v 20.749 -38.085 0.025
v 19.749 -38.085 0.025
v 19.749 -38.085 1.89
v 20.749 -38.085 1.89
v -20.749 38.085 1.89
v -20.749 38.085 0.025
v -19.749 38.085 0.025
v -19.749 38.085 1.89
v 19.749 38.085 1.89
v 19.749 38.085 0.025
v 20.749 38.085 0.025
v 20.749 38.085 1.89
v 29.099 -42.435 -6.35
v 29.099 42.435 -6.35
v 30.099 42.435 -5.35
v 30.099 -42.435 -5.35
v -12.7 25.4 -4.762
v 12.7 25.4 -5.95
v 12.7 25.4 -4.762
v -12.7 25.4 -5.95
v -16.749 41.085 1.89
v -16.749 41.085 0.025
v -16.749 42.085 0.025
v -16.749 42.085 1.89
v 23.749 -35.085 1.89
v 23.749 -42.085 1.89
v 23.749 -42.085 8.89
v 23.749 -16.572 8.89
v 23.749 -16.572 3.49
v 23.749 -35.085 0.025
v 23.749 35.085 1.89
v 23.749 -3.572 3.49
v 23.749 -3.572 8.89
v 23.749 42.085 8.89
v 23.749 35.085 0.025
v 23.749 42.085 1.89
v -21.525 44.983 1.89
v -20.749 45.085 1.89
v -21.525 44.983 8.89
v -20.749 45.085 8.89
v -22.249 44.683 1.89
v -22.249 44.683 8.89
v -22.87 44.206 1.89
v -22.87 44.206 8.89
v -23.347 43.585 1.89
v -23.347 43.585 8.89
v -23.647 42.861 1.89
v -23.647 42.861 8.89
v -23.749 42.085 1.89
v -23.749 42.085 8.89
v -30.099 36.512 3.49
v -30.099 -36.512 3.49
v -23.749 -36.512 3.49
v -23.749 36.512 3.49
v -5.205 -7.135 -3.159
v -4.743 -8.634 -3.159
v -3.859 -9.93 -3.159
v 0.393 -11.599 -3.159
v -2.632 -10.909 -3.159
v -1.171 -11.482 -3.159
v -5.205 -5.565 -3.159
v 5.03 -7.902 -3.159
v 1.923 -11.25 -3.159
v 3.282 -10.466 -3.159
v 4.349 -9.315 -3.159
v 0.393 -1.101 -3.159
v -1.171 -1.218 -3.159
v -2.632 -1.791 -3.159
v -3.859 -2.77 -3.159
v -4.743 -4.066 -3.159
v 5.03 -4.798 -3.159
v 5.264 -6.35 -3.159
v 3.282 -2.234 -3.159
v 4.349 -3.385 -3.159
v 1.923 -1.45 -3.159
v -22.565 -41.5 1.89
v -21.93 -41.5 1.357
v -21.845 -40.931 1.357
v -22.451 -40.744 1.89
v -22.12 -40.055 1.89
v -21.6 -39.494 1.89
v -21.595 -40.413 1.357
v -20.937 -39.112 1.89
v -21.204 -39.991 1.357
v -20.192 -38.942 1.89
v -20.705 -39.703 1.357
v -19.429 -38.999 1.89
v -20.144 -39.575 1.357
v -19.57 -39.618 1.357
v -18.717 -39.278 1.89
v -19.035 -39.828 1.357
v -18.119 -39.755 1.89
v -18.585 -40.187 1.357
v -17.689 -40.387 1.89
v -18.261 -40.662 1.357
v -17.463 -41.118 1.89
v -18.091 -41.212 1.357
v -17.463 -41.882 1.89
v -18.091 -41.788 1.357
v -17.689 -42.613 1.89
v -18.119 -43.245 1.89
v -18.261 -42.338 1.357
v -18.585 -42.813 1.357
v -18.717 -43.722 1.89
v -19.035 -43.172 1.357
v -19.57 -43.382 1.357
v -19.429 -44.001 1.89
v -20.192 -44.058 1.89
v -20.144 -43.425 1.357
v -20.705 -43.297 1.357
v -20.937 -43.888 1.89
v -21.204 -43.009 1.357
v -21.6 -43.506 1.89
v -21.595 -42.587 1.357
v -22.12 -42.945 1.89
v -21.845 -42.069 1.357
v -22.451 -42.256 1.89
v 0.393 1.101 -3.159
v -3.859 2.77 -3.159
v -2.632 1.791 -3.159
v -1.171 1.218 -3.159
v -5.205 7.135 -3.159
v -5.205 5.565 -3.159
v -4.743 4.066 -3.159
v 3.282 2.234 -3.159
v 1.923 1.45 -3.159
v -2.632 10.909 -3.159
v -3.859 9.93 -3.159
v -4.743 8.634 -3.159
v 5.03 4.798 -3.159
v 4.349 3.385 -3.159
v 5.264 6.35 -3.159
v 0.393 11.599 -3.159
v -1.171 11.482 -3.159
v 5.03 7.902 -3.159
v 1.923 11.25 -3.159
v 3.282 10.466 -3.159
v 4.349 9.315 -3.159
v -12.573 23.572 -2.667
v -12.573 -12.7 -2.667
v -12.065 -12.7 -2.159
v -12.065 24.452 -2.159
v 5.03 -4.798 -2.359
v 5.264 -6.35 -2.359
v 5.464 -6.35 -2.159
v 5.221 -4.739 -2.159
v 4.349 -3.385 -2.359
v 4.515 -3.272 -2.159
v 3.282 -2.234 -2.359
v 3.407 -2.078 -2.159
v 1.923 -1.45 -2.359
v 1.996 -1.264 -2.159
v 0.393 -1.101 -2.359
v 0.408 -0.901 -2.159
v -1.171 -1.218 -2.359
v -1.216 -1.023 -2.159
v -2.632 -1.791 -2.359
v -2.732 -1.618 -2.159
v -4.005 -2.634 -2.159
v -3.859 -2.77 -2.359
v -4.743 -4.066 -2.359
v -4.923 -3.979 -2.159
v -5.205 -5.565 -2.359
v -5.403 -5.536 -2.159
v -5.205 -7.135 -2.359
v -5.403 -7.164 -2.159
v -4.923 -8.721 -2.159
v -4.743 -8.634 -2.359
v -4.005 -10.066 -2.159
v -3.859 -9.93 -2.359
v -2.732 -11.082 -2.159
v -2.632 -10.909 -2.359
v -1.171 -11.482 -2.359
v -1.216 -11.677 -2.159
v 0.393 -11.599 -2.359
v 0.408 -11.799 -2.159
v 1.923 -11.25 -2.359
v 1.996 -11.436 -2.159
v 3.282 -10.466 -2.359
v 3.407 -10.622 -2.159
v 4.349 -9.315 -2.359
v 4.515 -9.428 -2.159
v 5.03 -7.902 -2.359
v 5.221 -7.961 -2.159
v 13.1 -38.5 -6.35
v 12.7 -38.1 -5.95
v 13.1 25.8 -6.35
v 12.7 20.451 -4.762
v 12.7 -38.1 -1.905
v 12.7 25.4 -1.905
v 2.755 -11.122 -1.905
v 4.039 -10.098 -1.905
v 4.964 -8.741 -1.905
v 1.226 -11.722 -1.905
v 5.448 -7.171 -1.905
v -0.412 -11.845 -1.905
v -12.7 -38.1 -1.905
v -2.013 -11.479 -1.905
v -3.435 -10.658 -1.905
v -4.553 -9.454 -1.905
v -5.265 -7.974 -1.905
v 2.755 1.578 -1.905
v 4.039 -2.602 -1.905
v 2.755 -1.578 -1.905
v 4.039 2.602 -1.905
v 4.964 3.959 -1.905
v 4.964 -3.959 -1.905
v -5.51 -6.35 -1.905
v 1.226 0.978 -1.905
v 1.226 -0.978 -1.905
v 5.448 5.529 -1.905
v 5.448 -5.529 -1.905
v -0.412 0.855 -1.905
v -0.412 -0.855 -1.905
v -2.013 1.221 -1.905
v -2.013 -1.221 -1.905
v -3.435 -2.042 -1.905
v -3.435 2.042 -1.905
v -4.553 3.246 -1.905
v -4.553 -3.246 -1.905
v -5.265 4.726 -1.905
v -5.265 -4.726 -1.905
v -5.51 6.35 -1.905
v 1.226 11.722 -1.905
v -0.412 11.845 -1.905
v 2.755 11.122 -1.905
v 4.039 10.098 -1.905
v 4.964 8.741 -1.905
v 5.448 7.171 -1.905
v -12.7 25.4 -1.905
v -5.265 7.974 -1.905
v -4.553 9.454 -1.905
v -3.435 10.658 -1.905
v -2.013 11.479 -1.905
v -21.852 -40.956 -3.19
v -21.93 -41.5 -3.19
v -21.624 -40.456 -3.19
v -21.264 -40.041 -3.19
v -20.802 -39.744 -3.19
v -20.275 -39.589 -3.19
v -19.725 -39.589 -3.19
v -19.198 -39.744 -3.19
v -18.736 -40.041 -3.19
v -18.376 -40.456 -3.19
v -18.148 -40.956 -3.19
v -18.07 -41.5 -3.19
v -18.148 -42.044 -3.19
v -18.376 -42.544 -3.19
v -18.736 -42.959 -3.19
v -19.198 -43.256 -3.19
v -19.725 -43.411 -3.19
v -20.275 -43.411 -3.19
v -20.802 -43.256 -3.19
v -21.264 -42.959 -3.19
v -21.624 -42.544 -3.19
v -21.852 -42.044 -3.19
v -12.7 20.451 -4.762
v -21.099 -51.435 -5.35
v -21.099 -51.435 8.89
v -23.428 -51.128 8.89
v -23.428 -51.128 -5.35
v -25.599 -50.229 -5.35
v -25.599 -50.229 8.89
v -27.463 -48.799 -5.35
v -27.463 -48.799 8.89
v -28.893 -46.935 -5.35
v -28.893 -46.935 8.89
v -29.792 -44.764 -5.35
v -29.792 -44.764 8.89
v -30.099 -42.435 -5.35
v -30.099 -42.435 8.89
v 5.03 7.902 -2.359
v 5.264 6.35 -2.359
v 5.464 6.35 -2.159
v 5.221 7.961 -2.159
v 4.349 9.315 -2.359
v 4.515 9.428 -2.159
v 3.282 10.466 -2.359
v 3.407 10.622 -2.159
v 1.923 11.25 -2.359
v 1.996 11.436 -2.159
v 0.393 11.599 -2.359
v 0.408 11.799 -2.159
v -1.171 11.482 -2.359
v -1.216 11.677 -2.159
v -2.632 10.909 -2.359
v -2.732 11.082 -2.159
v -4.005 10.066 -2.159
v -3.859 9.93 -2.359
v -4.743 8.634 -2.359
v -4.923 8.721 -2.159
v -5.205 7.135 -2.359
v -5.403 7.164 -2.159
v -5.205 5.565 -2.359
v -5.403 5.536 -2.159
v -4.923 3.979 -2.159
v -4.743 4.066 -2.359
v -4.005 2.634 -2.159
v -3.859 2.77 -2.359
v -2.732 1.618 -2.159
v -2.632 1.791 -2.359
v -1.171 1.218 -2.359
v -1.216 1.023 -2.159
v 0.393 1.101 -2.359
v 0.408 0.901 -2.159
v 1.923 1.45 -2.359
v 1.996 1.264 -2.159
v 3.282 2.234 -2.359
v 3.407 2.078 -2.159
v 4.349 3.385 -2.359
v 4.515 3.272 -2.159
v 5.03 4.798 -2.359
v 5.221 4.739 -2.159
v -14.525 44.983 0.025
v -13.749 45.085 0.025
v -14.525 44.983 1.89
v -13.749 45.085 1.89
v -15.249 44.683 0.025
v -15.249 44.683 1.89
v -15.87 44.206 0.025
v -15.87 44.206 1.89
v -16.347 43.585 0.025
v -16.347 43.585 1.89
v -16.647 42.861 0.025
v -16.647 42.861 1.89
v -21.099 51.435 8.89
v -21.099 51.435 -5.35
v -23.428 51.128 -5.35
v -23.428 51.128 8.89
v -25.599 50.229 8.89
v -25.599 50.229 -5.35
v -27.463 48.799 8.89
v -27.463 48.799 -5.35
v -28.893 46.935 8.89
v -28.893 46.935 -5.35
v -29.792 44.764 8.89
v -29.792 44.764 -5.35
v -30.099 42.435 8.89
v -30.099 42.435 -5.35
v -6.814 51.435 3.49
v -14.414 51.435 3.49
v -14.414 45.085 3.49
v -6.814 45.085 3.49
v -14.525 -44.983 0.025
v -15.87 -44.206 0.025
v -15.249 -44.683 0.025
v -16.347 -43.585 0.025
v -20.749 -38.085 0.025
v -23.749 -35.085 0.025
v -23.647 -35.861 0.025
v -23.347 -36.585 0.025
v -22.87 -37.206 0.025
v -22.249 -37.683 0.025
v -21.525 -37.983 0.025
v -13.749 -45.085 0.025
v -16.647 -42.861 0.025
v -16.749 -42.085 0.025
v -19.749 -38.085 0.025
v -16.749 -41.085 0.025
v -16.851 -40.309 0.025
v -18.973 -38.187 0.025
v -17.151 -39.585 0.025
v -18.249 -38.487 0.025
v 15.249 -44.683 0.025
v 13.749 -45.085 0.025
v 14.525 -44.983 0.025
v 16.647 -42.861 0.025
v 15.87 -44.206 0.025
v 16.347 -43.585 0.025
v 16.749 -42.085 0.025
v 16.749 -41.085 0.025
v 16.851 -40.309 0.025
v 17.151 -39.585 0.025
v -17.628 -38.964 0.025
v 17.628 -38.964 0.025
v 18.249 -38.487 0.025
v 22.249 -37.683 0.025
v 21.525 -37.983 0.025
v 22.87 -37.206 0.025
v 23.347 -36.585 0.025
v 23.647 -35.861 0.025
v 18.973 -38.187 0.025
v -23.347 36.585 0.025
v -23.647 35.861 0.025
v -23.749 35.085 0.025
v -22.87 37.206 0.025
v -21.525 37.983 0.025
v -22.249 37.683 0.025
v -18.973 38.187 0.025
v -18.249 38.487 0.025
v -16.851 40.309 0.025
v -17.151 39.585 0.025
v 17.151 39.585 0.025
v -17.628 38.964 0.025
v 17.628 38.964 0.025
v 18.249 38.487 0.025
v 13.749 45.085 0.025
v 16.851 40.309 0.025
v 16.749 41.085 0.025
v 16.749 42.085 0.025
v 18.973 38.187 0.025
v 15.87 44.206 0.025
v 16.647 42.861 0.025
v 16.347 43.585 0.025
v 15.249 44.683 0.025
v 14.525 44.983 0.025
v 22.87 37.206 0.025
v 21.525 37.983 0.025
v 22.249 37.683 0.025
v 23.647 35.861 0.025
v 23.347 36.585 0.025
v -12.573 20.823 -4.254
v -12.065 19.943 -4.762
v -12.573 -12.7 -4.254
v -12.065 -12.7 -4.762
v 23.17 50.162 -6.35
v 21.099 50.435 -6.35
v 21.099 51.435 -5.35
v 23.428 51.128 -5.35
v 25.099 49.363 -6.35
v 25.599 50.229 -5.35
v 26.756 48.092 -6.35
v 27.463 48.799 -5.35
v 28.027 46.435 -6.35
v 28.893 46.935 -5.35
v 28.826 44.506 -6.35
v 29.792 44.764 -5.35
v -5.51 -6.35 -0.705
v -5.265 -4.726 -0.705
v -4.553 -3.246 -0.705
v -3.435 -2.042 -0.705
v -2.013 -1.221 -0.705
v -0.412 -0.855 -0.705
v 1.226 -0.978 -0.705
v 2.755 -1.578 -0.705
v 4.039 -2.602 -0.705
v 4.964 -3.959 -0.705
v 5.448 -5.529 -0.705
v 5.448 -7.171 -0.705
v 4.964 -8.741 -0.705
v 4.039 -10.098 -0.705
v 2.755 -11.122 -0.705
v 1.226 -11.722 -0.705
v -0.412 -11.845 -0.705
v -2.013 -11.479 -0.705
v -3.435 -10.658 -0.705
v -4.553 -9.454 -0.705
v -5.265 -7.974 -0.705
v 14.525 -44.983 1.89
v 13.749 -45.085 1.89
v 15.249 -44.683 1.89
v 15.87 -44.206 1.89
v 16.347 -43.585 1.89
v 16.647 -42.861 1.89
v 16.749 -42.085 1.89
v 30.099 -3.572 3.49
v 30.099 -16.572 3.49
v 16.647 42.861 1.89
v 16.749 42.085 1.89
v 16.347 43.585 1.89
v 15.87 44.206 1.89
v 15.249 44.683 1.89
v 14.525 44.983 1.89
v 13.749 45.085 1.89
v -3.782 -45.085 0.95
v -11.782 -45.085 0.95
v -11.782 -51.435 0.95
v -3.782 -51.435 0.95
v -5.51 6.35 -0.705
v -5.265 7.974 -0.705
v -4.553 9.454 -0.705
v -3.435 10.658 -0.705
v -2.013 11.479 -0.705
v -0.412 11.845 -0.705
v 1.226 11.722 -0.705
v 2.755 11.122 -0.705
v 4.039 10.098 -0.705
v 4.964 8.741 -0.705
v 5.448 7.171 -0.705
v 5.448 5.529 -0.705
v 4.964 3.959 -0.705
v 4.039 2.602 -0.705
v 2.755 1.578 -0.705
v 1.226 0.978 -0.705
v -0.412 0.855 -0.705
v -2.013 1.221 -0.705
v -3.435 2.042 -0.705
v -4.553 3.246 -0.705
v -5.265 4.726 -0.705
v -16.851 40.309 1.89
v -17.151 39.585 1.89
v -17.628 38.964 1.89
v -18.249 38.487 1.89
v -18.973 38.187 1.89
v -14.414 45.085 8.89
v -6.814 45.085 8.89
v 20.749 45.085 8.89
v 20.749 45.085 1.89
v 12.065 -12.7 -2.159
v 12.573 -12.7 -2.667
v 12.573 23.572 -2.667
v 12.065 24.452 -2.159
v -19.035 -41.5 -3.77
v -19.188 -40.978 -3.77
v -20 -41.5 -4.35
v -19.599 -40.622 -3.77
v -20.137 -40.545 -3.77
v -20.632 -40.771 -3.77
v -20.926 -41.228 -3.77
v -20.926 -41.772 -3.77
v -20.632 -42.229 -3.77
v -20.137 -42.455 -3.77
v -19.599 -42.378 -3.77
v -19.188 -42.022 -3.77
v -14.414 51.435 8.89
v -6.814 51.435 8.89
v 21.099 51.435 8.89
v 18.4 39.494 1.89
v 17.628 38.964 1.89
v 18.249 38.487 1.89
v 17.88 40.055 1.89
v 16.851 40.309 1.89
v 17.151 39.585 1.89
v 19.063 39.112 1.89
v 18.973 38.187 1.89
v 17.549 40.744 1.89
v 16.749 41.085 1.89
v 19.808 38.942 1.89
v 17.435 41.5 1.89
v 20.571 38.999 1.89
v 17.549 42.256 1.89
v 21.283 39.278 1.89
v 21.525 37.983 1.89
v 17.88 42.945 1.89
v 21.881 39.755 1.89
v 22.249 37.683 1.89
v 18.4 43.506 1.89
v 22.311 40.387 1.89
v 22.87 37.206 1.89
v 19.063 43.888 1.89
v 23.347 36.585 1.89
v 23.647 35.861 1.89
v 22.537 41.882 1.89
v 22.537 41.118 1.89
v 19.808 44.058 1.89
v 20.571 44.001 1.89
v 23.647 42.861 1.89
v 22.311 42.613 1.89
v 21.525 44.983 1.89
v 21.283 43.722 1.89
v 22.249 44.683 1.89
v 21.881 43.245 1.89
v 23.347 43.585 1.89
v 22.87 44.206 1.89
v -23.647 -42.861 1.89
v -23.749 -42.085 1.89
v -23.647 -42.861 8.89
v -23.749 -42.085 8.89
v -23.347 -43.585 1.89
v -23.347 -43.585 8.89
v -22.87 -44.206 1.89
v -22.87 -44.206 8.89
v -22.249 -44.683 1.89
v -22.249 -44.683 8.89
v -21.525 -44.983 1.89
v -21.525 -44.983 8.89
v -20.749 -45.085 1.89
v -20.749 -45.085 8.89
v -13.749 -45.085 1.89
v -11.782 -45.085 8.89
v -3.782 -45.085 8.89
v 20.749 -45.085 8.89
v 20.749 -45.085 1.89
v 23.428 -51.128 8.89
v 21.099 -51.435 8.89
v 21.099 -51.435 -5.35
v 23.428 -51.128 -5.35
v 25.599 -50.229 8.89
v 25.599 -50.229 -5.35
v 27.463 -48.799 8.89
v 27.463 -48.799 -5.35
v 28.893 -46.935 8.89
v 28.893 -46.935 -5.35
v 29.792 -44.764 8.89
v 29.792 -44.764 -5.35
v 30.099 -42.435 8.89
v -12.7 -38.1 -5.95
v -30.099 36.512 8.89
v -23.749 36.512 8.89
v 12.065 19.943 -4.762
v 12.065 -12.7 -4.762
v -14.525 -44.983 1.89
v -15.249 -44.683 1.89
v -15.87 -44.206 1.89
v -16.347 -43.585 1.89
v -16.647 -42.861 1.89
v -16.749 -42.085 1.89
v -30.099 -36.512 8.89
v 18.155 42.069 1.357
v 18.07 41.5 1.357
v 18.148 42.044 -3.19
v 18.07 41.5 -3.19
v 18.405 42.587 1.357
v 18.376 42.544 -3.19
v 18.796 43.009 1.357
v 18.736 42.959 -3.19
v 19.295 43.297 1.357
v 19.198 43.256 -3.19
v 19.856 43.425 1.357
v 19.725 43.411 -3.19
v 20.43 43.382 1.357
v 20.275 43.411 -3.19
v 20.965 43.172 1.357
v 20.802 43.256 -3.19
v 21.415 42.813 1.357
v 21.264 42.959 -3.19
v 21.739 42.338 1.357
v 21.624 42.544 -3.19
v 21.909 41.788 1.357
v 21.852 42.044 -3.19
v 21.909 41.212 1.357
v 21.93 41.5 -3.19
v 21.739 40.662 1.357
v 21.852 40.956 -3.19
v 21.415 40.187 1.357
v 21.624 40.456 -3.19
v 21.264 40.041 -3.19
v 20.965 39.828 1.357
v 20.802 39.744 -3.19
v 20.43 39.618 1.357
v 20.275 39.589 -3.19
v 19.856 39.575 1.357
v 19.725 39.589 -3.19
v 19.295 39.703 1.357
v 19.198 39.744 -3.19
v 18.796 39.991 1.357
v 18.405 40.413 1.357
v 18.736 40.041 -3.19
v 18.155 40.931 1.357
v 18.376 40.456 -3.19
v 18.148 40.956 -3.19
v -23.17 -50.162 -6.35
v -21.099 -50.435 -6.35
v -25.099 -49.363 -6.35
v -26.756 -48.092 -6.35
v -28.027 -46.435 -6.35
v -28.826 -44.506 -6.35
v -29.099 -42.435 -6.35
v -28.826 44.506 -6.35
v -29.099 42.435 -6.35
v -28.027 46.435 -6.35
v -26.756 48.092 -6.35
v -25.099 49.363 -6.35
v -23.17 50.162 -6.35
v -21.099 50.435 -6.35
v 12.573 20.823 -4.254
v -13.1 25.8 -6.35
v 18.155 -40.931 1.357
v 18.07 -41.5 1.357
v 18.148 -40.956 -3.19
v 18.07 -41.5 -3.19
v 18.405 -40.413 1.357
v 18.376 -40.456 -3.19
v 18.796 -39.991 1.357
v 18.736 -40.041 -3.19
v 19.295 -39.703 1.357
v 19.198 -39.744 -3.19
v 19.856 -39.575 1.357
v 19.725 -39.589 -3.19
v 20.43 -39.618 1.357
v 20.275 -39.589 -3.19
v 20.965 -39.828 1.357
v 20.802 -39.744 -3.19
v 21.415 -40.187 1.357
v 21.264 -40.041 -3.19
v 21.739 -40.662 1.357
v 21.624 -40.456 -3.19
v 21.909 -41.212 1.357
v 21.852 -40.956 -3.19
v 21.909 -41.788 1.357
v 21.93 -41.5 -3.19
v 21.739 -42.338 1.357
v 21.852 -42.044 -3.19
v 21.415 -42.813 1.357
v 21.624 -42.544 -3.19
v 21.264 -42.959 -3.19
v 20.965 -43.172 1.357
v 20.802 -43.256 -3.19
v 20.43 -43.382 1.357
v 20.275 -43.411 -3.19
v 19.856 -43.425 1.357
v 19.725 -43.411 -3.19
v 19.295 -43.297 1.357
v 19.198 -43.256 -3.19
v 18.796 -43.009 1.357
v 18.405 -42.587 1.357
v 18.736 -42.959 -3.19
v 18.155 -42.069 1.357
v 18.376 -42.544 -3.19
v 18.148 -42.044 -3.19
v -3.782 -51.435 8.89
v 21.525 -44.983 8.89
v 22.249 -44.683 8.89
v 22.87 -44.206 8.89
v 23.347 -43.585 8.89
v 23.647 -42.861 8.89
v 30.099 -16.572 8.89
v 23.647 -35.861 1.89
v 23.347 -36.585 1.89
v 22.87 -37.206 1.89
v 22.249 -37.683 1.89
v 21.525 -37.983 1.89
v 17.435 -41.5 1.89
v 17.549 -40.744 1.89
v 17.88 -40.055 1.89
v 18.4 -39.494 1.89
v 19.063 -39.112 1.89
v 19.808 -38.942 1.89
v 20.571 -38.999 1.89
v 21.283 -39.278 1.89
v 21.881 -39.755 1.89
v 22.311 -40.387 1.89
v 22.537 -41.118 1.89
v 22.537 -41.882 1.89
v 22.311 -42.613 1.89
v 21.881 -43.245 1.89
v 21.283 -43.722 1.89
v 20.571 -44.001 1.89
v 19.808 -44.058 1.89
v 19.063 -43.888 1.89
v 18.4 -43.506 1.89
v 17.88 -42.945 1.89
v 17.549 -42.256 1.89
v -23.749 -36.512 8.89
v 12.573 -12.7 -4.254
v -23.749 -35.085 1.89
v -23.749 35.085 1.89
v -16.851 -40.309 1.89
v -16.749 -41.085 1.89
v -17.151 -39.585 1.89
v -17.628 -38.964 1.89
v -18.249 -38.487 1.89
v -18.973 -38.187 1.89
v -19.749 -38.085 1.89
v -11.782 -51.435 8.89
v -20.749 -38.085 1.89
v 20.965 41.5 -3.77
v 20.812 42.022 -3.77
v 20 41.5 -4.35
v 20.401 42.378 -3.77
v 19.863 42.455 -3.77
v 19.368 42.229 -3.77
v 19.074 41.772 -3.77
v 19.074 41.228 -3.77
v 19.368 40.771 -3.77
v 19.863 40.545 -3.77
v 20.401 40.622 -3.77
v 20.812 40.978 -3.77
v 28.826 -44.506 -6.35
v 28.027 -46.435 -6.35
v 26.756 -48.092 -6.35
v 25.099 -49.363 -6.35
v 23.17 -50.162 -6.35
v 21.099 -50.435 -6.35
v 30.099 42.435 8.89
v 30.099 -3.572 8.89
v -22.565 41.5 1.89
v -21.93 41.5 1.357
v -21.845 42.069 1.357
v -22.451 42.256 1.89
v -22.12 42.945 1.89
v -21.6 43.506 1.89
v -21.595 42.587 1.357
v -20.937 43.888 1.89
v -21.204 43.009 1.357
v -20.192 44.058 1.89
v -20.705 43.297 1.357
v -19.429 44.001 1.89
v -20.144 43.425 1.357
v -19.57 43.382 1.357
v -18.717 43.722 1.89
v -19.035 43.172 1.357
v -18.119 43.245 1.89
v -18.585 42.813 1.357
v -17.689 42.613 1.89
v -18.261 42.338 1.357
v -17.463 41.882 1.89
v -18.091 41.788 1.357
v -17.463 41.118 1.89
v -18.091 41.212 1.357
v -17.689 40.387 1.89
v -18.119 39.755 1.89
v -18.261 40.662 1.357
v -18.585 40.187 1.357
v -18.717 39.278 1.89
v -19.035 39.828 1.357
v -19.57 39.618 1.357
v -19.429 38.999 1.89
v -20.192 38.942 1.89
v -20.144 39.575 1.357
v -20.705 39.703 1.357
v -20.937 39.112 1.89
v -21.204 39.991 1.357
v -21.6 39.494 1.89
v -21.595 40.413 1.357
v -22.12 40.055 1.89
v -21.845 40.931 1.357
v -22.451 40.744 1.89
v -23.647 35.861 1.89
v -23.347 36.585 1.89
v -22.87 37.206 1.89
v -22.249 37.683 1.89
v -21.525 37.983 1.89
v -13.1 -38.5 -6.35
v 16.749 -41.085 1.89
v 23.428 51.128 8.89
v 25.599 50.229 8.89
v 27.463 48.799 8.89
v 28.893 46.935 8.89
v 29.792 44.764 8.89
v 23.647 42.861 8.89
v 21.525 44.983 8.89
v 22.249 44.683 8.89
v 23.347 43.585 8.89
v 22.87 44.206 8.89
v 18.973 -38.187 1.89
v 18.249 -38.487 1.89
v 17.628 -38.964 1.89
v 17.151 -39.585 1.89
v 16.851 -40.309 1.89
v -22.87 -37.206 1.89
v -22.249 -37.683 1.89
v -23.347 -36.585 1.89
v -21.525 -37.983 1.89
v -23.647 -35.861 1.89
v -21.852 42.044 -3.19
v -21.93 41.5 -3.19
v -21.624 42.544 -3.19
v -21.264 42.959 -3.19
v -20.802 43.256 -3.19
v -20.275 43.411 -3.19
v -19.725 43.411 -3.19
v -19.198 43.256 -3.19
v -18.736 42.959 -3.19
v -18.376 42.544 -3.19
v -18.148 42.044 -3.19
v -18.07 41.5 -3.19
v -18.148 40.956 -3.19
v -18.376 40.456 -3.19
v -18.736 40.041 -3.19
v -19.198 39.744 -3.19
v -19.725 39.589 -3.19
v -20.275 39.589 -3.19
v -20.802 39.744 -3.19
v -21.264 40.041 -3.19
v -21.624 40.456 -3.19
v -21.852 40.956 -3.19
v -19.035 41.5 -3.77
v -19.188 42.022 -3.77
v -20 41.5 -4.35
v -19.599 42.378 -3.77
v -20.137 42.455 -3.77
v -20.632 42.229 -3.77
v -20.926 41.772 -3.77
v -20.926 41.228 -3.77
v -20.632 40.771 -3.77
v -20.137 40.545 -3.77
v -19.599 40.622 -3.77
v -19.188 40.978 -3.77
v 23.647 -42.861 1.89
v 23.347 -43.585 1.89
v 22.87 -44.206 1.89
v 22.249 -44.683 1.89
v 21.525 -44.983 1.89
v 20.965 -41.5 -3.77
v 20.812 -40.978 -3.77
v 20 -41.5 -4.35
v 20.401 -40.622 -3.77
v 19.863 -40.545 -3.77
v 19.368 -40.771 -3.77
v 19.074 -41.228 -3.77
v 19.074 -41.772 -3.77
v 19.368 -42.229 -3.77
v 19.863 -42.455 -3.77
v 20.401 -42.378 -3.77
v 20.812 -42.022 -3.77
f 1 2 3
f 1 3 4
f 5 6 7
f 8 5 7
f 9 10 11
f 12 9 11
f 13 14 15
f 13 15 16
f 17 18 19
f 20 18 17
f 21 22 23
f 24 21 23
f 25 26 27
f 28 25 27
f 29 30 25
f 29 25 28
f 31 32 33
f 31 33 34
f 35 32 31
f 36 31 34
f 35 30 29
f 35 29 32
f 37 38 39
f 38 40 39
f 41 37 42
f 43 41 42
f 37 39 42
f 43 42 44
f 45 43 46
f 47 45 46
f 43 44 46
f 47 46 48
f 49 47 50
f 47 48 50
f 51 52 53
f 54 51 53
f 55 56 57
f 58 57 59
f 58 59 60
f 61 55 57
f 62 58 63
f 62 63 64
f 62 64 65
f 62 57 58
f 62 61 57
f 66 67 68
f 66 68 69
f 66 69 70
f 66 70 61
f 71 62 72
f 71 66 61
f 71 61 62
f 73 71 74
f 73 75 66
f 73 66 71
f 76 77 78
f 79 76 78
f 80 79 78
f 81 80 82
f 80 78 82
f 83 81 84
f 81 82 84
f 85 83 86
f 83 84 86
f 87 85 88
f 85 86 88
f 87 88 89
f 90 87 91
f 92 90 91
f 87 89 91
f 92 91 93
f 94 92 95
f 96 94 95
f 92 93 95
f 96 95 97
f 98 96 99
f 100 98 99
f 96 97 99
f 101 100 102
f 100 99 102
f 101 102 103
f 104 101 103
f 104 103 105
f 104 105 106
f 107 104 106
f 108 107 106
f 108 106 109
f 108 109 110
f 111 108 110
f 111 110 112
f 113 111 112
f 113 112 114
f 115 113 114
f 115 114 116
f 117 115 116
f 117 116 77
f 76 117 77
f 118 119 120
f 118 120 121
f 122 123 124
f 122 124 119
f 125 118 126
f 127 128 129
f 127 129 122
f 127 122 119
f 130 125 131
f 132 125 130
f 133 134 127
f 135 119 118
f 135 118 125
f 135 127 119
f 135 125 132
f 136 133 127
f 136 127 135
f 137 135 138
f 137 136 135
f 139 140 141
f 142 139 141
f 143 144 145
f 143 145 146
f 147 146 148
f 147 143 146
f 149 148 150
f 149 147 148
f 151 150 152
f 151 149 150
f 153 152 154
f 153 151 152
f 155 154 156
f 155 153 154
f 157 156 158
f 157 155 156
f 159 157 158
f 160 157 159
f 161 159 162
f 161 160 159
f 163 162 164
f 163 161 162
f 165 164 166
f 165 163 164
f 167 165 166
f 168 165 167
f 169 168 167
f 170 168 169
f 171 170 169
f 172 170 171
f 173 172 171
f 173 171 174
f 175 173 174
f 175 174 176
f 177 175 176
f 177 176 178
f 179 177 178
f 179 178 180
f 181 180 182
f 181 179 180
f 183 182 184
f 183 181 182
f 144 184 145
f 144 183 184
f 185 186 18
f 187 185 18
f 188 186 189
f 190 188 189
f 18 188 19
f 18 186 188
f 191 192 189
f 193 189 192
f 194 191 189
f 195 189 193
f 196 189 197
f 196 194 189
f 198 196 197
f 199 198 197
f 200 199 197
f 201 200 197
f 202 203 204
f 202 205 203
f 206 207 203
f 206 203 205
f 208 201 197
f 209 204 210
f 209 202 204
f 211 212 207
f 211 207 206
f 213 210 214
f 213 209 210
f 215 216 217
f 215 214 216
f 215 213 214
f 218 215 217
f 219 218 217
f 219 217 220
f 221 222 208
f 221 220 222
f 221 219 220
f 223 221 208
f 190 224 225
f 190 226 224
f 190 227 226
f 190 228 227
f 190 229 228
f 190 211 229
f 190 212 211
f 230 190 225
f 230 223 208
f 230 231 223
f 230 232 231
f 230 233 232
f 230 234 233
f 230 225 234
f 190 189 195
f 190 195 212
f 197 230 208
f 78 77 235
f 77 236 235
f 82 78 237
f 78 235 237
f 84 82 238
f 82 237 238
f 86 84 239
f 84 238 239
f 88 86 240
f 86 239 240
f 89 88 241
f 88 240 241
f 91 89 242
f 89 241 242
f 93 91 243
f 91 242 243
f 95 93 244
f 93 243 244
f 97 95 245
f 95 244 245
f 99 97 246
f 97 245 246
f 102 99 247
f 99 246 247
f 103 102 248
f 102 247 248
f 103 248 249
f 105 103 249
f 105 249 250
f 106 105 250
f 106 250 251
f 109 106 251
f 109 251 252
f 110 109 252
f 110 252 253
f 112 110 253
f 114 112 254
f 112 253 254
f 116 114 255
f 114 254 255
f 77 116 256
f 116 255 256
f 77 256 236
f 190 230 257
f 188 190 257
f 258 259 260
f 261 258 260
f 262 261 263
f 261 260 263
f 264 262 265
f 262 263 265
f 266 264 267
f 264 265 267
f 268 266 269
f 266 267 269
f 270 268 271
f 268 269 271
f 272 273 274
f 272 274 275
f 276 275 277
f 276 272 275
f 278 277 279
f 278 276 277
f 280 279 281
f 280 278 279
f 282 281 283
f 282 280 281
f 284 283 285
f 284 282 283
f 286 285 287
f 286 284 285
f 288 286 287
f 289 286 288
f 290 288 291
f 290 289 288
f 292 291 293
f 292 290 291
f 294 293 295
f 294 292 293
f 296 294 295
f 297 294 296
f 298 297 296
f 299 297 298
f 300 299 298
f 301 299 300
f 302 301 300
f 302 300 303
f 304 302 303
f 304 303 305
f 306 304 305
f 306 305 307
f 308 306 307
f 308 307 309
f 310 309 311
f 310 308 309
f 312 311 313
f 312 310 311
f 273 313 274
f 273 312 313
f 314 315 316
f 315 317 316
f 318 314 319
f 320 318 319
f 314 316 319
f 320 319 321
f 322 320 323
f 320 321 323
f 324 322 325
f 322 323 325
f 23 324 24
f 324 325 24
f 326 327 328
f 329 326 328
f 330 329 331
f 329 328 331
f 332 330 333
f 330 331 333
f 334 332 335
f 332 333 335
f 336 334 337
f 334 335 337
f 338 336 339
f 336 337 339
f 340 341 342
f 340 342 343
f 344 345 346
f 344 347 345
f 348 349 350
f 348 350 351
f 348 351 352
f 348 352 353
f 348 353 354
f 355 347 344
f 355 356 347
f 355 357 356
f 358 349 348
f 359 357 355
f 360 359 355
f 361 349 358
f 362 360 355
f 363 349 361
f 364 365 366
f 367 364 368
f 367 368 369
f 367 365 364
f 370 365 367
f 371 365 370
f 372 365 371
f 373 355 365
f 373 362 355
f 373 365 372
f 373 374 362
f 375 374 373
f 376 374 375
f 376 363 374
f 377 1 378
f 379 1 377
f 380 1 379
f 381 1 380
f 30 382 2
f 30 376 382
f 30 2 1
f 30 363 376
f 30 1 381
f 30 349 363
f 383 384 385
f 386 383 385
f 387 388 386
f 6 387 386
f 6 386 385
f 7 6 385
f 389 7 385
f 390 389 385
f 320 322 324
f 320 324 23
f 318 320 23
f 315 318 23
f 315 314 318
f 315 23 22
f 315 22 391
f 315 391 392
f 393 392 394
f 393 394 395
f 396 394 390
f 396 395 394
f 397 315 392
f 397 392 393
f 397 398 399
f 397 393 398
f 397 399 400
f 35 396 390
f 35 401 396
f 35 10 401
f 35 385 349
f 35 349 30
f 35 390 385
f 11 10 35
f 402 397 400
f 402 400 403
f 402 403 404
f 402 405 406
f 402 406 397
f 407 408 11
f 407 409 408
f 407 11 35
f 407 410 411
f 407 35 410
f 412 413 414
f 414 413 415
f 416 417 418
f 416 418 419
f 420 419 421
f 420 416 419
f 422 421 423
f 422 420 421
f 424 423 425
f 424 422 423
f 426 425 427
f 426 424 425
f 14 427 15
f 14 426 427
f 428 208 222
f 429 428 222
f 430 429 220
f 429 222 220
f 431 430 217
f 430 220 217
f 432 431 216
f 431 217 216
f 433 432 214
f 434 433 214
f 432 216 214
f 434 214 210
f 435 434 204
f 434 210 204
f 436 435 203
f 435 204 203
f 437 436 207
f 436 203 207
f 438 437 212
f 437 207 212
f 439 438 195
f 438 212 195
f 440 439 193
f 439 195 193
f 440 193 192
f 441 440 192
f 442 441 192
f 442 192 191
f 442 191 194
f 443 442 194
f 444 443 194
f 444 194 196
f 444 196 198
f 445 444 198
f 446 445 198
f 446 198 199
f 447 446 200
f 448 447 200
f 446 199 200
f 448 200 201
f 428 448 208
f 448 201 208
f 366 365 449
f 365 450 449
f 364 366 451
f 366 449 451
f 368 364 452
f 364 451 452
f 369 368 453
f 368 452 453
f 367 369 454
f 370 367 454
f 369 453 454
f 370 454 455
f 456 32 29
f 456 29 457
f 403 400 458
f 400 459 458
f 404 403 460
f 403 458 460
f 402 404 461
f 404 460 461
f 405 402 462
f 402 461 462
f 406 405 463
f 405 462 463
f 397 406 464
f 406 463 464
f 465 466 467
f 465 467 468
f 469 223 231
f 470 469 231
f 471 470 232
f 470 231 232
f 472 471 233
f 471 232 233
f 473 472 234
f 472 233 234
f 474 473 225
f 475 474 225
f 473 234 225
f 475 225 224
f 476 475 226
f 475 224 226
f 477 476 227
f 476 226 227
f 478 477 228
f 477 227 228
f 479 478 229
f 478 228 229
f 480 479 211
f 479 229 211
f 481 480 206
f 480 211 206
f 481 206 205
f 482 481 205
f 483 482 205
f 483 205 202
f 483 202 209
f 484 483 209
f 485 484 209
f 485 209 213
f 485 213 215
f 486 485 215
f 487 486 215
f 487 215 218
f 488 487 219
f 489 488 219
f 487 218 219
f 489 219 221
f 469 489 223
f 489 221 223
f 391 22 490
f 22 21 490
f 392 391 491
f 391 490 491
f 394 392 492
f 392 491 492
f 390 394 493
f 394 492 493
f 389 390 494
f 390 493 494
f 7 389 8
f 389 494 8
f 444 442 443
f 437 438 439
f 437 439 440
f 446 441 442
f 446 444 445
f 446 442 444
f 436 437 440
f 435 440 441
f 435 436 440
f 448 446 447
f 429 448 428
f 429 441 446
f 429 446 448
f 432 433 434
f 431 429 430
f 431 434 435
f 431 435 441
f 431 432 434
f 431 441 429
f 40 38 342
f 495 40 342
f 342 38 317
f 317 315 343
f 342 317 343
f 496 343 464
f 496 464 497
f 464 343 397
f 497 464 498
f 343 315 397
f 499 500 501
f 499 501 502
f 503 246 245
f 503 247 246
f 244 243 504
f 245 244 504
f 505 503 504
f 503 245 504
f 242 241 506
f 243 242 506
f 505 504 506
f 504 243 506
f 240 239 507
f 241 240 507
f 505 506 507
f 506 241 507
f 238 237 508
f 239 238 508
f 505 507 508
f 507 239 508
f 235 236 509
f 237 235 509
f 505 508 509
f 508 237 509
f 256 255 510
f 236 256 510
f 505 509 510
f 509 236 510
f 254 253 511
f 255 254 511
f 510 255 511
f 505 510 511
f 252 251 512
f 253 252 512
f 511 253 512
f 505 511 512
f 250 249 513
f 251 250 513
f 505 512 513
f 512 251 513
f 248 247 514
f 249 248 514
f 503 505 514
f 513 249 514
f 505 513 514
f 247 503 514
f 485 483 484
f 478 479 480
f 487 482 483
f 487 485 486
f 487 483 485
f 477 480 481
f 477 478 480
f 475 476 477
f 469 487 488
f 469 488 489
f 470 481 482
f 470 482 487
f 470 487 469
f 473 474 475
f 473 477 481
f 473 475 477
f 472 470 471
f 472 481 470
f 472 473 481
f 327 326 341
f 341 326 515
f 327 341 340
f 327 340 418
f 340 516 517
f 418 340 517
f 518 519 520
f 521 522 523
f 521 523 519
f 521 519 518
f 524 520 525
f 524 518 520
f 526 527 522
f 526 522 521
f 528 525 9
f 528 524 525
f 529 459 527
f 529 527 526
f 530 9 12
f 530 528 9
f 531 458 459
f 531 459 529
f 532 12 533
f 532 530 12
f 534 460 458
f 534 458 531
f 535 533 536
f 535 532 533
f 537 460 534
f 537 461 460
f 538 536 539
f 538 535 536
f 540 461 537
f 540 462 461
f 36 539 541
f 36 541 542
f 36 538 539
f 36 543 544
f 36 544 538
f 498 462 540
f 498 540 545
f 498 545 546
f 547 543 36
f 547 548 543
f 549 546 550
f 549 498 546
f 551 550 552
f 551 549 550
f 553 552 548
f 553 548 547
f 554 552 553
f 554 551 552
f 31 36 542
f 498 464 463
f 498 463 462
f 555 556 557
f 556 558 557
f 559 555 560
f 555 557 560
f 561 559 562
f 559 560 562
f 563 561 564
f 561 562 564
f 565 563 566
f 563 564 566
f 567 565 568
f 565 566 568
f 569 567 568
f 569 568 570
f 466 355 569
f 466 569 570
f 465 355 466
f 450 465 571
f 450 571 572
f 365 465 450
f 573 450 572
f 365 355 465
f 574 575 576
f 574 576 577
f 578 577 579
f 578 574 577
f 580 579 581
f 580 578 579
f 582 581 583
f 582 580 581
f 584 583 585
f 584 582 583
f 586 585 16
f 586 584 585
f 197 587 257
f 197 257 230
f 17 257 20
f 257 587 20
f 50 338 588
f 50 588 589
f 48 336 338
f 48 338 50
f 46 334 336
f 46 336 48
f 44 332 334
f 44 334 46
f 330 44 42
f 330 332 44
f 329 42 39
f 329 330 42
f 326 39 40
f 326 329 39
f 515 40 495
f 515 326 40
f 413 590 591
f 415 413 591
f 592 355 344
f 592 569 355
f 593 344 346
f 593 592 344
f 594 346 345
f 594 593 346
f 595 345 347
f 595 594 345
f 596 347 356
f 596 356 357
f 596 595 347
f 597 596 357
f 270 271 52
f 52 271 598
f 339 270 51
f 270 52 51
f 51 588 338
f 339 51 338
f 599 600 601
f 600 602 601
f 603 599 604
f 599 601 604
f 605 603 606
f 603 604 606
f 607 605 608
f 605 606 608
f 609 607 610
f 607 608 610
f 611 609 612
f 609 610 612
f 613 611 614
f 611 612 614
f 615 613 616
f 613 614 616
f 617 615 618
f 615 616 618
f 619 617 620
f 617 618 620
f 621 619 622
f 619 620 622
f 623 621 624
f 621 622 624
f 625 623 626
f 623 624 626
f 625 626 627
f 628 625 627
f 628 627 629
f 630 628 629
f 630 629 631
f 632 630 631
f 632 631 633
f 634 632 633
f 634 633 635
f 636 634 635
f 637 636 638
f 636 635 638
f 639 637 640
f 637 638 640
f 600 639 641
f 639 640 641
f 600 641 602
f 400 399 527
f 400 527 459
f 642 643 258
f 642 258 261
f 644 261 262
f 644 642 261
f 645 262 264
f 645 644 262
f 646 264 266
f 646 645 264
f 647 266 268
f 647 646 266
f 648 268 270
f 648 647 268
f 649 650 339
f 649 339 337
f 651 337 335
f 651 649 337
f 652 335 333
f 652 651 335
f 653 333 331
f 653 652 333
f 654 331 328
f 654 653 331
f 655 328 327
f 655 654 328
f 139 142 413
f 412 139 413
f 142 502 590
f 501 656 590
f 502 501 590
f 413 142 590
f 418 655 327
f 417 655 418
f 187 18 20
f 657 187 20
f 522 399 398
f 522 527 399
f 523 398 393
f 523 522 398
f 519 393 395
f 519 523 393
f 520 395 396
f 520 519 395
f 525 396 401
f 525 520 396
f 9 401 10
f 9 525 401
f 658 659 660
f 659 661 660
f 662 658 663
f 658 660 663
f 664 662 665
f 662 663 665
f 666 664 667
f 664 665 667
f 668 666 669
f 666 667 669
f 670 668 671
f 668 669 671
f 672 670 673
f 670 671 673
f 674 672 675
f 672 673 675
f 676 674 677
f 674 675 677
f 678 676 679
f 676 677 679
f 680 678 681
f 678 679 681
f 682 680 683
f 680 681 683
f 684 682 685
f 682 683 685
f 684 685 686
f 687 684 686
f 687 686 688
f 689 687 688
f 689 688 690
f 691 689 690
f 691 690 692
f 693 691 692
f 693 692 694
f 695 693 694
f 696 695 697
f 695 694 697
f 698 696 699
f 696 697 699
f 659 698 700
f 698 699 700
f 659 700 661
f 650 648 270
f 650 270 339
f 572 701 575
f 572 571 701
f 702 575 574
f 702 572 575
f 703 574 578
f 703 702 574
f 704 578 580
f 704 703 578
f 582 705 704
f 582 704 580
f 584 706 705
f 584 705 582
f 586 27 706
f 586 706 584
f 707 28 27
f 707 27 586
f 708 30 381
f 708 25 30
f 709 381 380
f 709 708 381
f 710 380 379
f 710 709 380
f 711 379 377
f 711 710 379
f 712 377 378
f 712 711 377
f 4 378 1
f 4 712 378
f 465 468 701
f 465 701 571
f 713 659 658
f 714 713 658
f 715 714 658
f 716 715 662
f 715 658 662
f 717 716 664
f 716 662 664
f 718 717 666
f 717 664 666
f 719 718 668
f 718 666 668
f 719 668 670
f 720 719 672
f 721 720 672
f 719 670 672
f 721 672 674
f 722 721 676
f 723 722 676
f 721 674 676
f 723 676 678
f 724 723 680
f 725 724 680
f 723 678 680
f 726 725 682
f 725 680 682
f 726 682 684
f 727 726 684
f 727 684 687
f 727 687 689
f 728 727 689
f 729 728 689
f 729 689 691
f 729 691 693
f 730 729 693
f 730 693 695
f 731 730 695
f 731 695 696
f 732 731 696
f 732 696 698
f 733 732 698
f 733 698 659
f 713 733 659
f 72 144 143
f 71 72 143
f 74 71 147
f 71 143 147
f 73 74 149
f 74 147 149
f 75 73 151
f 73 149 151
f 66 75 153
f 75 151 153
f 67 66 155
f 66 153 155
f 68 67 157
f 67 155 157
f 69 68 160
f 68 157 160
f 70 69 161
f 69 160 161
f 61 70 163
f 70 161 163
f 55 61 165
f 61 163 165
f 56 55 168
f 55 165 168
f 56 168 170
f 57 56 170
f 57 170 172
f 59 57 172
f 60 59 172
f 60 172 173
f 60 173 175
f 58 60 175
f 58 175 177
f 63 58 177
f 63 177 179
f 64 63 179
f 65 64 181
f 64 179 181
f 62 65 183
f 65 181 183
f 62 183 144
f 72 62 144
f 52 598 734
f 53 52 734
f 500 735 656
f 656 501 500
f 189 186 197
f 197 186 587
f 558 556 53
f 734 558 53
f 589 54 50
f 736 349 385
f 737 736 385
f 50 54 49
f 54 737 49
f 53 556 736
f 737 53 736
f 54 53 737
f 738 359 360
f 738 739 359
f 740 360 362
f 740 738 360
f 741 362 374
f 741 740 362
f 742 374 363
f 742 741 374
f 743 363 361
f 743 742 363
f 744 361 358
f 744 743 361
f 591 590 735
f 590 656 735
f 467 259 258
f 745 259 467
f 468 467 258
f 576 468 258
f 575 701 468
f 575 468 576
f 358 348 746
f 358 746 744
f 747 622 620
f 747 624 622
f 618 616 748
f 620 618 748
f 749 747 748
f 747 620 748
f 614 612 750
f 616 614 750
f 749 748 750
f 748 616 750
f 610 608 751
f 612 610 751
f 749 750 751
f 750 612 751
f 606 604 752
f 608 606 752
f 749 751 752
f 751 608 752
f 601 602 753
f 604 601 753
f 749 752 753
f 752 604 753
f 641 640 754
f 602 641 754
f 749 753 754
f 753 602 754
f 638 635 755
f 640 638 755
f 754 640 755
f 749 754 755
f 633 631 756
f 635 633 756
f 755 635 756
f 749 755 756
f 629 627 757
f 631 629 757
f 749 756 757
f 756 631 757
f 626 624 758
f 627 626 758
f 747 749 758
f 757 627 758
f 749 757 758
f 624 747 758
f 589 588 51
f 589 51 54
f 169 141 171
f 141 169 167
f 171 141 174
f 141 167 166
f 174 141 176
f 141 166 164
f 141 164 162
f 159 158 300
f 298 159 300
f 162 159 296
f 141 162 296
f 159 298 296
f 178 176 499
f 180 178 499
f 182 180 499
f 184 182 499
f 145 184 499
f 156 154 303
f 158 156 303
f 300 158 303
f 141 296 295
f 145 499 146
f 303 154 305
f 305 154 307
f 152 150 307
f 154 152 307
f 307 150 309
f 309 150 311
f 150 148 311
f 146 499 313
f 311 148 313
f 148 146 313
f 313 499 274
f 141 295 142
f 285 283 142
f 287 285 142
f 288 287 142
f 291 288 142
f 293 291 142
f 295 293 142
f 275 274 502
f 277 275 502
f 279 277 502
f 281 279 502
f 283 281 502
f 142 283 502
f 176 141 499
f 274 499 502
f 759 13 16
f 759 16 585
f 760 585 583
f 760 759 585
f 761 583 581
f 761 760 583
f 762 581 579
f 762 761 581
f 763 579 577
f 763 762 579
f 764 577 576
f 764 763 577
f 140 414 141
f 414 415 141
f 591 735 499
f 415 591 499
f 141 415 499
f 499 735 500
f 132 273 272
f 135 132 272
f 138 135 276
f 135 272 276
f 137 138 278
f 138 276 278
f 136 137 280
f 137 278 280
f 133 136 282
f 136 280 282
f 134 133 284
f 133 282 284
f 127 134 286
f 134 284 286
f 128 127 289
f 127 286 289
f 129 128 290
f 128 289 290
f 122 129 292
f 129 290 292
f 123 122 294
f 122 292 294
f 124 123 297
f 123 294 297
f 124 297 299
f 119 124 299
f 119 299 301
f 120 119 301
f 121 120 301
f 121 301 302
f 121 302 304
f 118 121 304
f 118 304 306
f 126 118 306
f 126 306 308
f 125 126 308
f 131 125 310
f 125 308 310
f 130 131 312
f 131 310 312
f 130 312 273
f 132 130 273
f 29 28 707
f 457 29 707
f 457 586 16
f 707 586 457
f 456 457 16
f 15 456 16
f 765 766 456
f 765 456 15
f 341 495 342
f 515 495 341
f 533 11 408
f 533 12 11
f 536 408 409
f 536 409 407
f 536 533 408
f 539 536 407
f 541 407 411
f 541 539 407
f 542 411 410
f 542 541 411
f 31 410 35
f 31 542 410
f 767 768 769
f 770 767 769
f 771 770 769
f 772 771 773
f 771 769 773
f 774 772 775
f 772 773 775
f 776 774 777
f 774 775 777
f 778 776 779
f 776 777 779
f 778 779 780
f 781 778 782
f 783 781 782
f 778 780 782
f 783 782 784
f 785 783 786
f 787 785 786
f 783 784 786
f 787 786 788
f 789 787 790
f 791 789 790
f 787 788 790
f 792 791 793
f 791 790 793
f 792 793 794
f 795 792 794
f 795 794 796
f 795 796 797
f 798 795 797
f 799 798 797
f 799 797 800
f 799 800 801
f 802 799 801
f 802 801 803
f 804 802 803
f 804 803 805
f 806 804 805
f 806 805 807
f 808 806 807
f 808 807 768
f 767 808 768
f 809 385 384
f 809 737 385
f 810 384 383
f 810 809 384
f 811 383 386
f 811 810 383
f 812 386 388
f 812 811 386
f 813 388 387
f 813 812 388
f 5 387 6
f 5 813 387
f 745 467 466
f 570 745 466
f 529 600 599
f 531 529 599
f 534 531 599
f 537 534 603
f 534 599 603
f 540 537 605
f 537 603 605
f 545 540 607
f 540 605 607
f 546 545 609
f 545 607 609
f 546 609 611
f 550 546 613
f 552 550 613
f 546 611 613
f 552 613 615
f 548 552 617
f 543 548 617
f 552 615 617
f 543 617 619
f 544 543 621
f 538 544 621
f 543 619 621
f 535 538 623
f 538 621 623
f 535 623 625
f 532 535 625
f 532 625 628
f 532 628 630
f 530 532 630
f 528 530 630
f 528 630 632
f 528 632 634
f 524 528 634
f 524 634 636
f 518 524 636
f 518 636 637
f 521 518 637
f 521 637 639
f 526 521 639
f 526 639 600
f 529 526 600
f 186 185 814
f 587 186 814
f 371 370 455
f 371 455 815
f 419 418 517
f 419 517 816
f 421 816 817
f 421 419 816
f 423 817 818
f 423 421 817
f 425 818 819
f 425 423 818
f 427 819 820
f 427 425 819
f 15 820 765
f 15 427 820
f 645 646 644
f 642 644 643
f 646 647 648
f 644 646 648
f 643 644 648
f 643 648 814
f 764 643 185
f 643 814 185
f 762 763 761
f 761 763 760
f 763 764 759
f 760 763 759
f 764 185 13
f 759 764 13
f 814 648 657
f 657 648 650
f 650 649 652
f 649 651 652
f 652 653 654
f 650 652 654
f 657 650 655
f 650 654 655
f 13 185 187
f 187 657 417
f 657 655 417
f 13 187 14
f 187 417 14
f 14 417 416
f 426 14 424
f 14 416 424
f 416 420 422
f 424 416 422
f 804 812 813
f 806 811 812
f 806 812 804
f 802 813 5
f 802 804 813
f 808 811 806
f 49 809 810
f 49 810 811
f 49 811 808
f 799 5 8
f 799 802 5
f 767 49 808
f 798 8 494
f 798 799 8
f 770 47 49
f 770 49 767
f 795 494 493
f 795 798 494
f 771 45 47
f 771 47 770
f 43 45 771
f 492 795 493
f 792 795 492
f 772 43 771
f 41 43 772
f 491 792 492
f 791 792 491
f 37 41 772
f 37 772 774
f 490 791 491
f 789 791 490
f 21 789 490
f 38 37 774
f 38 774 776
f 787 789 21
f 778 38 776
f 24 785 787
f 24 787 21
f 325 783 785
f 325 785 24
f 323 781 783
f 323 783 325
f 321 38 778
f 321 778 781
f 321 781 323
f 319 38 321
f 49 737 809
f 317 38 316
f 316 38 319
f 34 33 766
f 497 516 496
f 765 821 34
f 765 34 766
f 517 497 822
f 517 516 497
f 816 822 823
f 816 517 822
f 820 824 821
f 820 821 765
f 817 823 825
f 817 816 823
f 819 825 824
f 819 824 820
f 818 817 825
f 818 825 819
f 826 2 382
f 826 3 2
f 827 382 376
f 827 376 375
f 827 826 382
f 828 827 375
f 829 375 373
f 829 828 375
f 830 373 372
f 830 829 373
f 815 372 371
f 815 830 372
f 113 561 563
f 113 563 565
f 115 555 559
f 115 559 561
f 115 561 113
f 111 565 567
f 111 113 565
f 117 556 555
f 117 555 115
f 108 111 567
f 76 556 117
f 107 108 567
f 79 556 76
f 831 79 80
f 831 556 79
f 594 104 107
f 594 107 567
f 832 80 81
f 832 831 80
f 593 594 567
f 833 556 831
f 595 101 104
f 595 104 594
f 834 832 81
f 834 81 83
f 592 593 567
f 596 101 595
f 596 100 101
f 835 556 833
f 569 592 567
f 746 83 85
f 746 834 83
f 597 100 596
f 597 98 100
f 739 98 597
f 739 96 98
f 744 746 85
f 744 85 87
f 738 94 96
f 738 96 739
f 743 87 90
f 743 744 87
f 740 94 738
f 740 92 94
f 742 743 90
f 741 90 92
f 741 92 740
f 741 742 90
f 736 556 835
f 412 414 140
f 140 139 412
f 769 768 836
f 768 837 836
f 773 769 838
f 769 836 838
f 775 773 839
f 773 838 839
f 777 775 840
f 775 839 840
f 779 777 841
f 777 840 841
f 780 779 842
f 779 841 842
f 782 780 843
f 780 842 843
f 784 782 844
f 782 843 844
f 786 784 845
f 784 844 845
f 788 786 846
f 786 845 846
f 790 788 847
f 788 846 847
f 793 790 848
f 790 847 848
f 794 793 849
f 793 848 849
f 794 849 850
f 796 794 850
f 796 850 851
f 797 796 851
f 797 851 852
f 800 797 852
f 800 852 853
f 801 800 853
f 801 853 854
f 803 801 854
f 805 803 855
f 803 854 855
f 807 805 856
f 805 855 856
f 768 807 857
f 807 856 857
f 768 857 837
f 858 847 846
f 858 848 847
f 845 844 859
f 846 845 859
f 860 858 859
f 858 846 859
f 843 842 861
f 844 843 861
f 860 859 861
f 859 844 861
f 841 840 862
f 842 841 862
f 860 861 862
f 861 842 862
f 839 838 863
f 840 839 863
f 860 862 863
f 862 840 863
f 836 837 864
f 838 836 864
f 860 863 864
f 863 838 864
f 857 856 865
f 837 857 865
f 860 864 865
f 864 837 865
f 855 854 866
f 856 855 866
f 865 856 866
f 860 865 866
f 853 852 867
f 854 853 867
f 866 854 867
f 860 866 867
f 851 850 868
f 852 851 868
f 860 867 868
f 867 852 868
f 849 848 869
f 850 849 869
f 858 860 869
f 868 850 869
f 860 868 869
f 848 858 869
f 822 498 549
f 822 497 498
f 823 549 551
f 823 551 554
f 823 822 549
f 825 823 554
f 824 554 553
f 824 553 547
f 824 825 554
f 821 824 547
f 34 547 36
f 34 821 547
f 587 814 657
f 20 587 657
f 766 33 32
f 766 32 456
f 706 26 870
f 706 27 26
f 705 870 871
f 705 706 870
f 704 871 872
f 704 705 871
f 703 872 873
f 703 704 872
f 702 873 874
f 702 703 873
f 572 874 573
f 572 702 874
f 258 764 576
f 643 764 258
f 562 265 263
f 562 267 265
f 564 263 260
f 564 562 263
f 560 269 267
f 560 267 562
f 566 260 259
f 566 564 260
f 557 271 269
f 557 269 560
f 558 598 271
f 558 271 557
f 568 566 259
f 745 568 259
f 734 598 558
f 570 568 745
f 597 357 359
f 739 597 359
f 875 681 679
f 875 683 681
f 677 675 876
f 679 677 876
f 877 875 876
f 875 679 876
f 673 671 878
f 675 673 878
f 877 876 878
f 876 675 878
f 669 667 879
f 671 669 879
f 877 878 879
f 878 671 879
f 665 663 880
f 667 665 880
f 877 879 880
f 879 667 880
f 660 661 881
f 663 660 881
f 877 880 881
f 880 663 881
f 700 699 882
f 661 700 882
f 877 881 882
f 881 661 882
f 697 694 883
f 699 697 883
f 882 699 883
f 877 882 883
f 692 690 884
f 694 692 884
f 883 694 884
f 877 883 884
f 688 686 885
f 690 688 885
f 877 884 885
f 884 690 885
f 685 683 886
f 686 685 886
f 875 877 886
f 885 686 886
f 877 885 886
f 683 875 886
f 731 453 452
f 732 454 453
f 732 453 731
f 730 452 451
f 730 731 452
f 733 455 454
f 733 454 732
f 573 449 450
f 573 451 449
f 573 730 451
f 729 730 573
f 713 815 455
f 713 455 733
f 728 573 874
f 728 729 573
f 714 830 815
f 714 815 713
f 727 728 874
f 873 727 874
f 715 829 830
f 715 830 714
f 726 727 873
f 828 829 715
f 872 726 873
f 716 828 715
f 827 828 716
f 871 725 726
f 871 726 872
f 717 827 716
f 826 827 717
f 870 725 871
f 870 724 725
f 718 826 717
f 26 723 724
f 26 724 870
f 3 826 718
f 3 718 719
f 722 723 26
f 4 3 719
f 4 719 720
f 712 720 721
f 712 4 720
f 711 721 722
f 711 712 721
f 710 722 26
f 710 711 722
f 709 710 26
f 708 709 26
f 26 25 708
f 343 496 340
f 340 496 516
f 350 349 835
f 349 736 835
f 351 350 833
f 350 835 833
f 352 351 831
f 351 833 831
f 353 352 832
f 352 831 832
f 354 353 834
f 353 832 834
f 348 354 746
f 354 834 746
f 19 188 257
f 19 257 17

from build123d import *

# Parameters (mm, degrees)
SKETCH1_W                             = 60.198
SKETCH1_H                             = 102.87
BOSS_EXTRUDE1_DEPTH                   = 0.0254
BOSS_EXTRUDE1_DEPTH_BACK              = 6.35
SKETCH1_3_W                           = 60.198
SKETCH1_3_H                           = 102.87
SKETCH1_3_W_2                         = 47.498
SKETCH1_3_H_2                         = 90.17
BOSS_EXTRUDE2_DEPTH                   = 8.89
SKETCH2_W                             = 7
SKETCH2_H                             = 7
BOSS_EXTRUDE3_DEPTH                   = 1.8646
F_24_0_152_DIAMETER_HOLE1_D           = 3.8608
F_24_0_152_DIAMETER_HOLE1_DEPTH       = 5.08
F_24_0_152_DIAMETER_HOLE1_CSINK_D     = 5.1308
F_24_0_152_DIAMETER_HOLE1_CSINK_ANGLE = 100
F_24_0_152_DIAMETER_HOLE1_TIP         = 1.159901339
SKETCH6_W                             = 6.35
SKETCH6_H                             = 73.025
SKETCH6_W_2                           = 8.000000002
SKETCH6_H_2                           = 6.35
SKETCH6_W_3                           = 7.60000004
SKETCH6_H_3                           = 12.999999908
CUT_EXTRUDE1_DEPTH                    = 5.4
FILLET1_R                             = 3
FILLET2_R                             = 9
CHAMFER1_SIZE                         = 1
SKETCH9_W                             = 25.4
SKETCH9_H                             = 63.5
CUT_EXTRUDE2_DEPTH                    = 4.445
BOSS_EXTRUDE4_REACH                   = 32.099
BOSS_EXTRUDE4_DIRECTION_2_REACH       = 32.099
BOSS_EXTRUDE5_DEPTH                   = 12.573
BOSS_EXTRUDE5_DEPTH_BACK              = 12.573
CUT_EXTRUDE3_START                    = -1.254
SKETCH11_R                            = 5.01
CUT_EXTRUDE3_DEPTH                    = 2.454
SKETCH12_R                            = 5.51
CUT_EXTRUDE4_DEPTH                    = 1.2
SKETCH13_W                            = 8.000000002
SKETCH13_H                            = 6.35
CUT_EXTRUDE5_DEPTH                    = 2.54
CHAMFER2_SIZE                         = 0.399999962
CHAMFER3_SIZE                         = 0.508
SKETCH14_R                            = 5.264
CUT_EXTRUDE6_DEPTH                    = 1
CHAMFER4_SIZE                         = 0.2


with BuildPart() as part:
    # Sketch1 → Boss-Extrude1 (new body, two sides)
    with BuildSketch(Plane.XY) as boss_extrude1_sk:
        Rectangle(SKETCH1_W, SKETCH1_H)
    extrude(amount=BOSS_EXTRUDE1_DEPTH)
    extrude(boss_extrude1_sk.sketch, amount=-BOSS_EXTRUDE1_DEPTH_BACK)

    # Sketch1_3 → Boss-Extrude2 (add)
    with BuildSketch(Plane.XY):
        Rectangle(SKETCH1_3_W, SKETCH1_3_H)
        Rectangle(SKETCH1_3_W_2, SKETCH1_3_H_2, mode=Mode.SUBTRACT)
    extrude(amount=BOSS_EXTRUDE2_DEPTH)

    # Sketch2 → Boss-Extrude3 (add)
    with BuildSketch(Plane.XY.offset(0.0254)):
        with Locations((20.249, 41.585)):
            Rectangle(SKETCH2_W, SKETCH2_H)
        with Locations((20.249, -41.585)):
            Rectangle(SKETCH2_W, SKETCH2_H)
        with Locations((-20.249, -41.585)):
            Rectangle(SKETCH2_W, SKETCH2_H)
        with Locations((-20.249, 41.585)):
            Rectangle(SKETCH2_W, SKETCH2_H)
    extrude(amount=BOSS_EXTRUDE3_DEPTH)

    # 24 _0.152_ Diameter Hole1
    with Locations(Plane(origin=(-20, 41.5, 1.89000003), x_dir=(1, 0, 0), z_dir=(0, 0, 1))):
        with Locations((0, 0), (40, 0), (40, -83), (0, -83)):
            CounterSinkHole(F_24_0_152_DIAMETER_HOLE1_D / 2, F_24_0_152_DIAMETER_HOLE1_CSINK_D / 2, depth=F_24_0_152_DIAMETER_HOLE1_DEPTH, counter_sink_angle=F_24_0_152_DIAMETER_HOLE1_CSINK_ANGLE)
            with Locations((0, 0, -(F_24_0_152_DIAMETER_HOLE1_DEPTH + F_24_0_152_DIAMETER_HOLE1_TIP / 2))):  # 118° drill point
                Cone(0, F_24_0_152_DIAMETER_HOLE1_D / 2, F_24_0_152_DIAMETER_HOLE1_TIP, mode=Mode.SUBTRACT)

    # Sketch6 → Cut-Extrude1 (cut)
    with BuildSketch(Plane.XY.offset(8.89)):
        with Locations((-26.924, 0)):
            Rectangle(SKETCH6_W, SKETCH6_H)
        with Locations((-7.782174936, -48.26)):
            Rectangle(SKETCH6_W_2, SKETCH6_H_2)
        with Locations((-10.614000108, 48.26)):
            Rectangle(SKETCH6_W_3, SKETCH6_H_2)
        with Locations((26.924, -10.071789928)):
            Rectangle(SKETCH6_W, SKETCH6_H_3)
    extrude(amount=-CUT_EXTRUDE1_DEPTH, mode=Mode.SUBTRACT)

    # Fillet1
    fillet1_edges = [part.edges().sort_by_distance(p)[0] for p in [
        (-16.749, 45.085, 0.9577),
        (-23.749, 38.085, 0.9577),
        (-16.749, 38.085, 0.9577),
        (-23.749, -45.085, 5.39),
        (23.749, -45.085, 5.39),
        (23.749, 45.085, 5.39),
        (-23.749, 45.085, 5.39),
        (23.749, 38.085, 0.9577),
        (16.749, 38.085, 0.9577),
        (16.749, 45.085, 0.9577),
        (23.749, -38.085, 0.9577),
        (16.749, -45.085, 0.9577),
        (16.749, -38.085, 0.9577),
        (-23.749, -38.085, 0.9577),
        (-16.749, -38.085, 0.9577),
        (-16.749, -45.085, 0.9577),
    ]]
    fillet(fillet1_edges, radius=FILLET1_R)

    # Fillet2
    fillet2_edges = [part.edges().sort_by_distance(p)[0] for p in [
        (30.099, 51.435, 1.27),
        (-30.099, 51.435, 1.27),
        (-30.099, -51.435, 1.27),
        (30.099, -51.435, 1.27),
    ]]
    fillet(fillet2_edges, radius=FILLET2_R)

    # Chamfer1
    chamfer1_edges = [part.edges().sort_by_distance(p)[0] for p in [
        (0, 51.435, -6.35),
        (30.099, 0, -6.35),
        (0, -51.435, -6.35),
        (-30.099, 0, -6.35),
        (-27.462961031, 48.798961031, -6.35),
        (-27.462961031, -48.798961031, -6.35),
        (27.462961031, -48.798961031, -6.35),
        (27.462961031, 48.798961031, -6.35),
    ]]
    chamfer(chamfer1_edges, length=CHAMFER1_SIZE)

    # Sketch9 → Cut-Extrude2 (cut)
    with BuildSketch(Plane(origin=(0, 0, -6.35), x_dir=(-1, 0, 0), z_dir=(0, 0, -1))):
        with Locations((0, -6.35)):
            Rectangle(SKETCH9_W, SKETCH9_H)
    extrude(amount=-CUT_EXTRUDE2_DEPTH, mode=Mode.SUBTRACT)

    # Sketch10 → Boss-Extrude4 (add, up to next)
    with BuildSketch(Plane(origin=(0, 0, 0), x_dir=(0, 0, -1), z_dir=(1, 0, 0)), mode=Mode.PRIVATE) as boss_extrude4_sk1:
        Polygon((4.7625, 20.450664817), (4.7625, 25.4), (1.905, 25.4), align=None)
    boss_extrude4_tool1 = extrude(boss_extrude4_sk1.sketch, amount=BOSS_EXTRUDE4_REACH, mode=Mode.PRIVATE) - part.part
    add(boss_extrude4_tool1.solids().sort_by_distance((0, 23.750222, -3.81))[0])

    # Sketch10 → Boss-Extrude4 direction 2 (add, up to next)
    with BuildSketch(Plane(origin=(0, 0, 0), x_dir=(0, 0, -1), z_dir=(1, 0, 0)), mode=Mode.PRIVATE) as boss_extrude4_direction_2_sk1:
        Polygon((4.7625, 20.450664817), (4.7625, 25.4), (1.905, 25.4), align=None)
    boss_extrude4_direction_2_tool1 = extrude(boss_extrude4_direction_2_sk1.sketch, amount=-BOSS_EXTRUDE4_DIRECTION_2_REACH, mode=Mode.PRIVATE) - part.part
    add(boss_extrude4_direction_2_tool1.solids().sort_by_distance((0, 23.750222, -3.81))[0])


with BuildPart() as body_2:
    # Sketch10_3 → Boss-Extrude5 (new body, two sides)
    with BuildSketch(Plane(origin=(0, 0, 0), x_dir=(0, 0, -1), z_dir=(1, 0, 0))) as boss_extrude5_sk:
        Polygon((2.159, 24.452059095), (4.7625, 19.942664817), (4.7625, -12.7), (2.159, -12.7), align=None)
    extrude(amount=BOSS_EXTRUDE5_DEPTH)
    extrude(boss_extrude5_sk.sketch, amount=-BOSS_EXTRUDE5_DEPTH_BACK)


with BuildPart() as cut_extrude3_tool:
    # Sketch11 → Cut-Extrude3 (new body)
    with BuildSketch(Plane.XY.offset(-1.905).offset(CUT_EXTRUDE3_START)):
        with Locations((0, -6.35)):
            Circle(SKETCH11_R)
        with Locations((0, 6.35)):
            Circle(SKETCH11_R)
    extrude(amount=CUT_EXTRUDE3_DEPTH)


with BuildPart() as part_1:
    add(part.part)

    # Cut-Extrude3: cut by cut_extrude3_tool
    add(cut_extrude3_tool.part, mode=Mode.SUBTRACT)

    # Sketch12 → Cut-Extrude4 (cut)
    with BuildSketch(Plane(origin=(0, 0, -1.905), x_dir=(-1, 0, 0), z_dir=(0, 0, -1))):
        with Locations((0, 6.35)):
            Circle(SKETCH12_R)
        with Locations((0, -6.35)):
            Circle(SKETCH12_R)
    extrude(amount=-CUT_EXTRUDE4_DEPTH, mode=Mode.SUBTRACT)

    # Sketch13 → Cut-Extrude5 (cut)
    with BuildSketch(Plane.XY.offset(3.490000132)):
        with Locations((-7.782174936, -48.26)):
            Rectangle(SKETCH13_W, SKETCH13_H)
    extrude(amount=-CUT_EXTRUDE5_DEPTH, mode=Mode.SUBTRACT)

    # Chamfer2
    chamfer2_edges = [part_1.edges().sort_by_distance(p)[0] for p in [
        (-12.7, -6.35, -6.35),
        (0, 25.4, -6.35),
        (12.7, -6.35, -6.35),
        (0, -38.1, -6.35),
    ]]
    chamfer(chamfer2_edges, length=CHAMFER2_SIZE)


with BuildPart() as body_2_1:
    add(body_2.part)

    # Cut-Extrude3: cut by cut_extrude3_tool
    add(cut_extrude3_tool.part, mode=Mode.SUBTRACT)

    # Chamfer3
    chamfer3_edges = [body_2_1.edges().sort_by_distance(p)[0] for p in [
        (12.573, 3.621332409, -4.7625),
        (12.573, 5.876029547, -2.159),
        (-12.573, 3.621332409, -4.7625),
        (-12.573, 5.876029547, -2.159),
    ]]
    chamfer(chamfer3_edges, length=CHAMFER3_SIZE)

    # Sketch14 → Cut-Extrude6 (cut)
    with BuildSketch(Plane.XY.offset(-2.159)):
        with Locations((0, 6.35)):
            Circle(SKETCH14_R)
        with Locations((0, -6.35)):
            Circle(SKETCH14_R)
    extrude(amount=-CUT_EXTRUDE6_DEPTH, mode=Mode.SUBTRACT)

    # Chamfer4
    chamfer4_edges = [body_2_1.edges().sort_by_distance(p)[0] for p in [
        (-5.264, 6.35, -2.159),
        (-5.264, -6.35, -2.159),
    ]]
    chamfer(chamfer4_edges, length=CHAMFER4_SIZE)


solid = Compound([part_1.part, body_2_1.part])
